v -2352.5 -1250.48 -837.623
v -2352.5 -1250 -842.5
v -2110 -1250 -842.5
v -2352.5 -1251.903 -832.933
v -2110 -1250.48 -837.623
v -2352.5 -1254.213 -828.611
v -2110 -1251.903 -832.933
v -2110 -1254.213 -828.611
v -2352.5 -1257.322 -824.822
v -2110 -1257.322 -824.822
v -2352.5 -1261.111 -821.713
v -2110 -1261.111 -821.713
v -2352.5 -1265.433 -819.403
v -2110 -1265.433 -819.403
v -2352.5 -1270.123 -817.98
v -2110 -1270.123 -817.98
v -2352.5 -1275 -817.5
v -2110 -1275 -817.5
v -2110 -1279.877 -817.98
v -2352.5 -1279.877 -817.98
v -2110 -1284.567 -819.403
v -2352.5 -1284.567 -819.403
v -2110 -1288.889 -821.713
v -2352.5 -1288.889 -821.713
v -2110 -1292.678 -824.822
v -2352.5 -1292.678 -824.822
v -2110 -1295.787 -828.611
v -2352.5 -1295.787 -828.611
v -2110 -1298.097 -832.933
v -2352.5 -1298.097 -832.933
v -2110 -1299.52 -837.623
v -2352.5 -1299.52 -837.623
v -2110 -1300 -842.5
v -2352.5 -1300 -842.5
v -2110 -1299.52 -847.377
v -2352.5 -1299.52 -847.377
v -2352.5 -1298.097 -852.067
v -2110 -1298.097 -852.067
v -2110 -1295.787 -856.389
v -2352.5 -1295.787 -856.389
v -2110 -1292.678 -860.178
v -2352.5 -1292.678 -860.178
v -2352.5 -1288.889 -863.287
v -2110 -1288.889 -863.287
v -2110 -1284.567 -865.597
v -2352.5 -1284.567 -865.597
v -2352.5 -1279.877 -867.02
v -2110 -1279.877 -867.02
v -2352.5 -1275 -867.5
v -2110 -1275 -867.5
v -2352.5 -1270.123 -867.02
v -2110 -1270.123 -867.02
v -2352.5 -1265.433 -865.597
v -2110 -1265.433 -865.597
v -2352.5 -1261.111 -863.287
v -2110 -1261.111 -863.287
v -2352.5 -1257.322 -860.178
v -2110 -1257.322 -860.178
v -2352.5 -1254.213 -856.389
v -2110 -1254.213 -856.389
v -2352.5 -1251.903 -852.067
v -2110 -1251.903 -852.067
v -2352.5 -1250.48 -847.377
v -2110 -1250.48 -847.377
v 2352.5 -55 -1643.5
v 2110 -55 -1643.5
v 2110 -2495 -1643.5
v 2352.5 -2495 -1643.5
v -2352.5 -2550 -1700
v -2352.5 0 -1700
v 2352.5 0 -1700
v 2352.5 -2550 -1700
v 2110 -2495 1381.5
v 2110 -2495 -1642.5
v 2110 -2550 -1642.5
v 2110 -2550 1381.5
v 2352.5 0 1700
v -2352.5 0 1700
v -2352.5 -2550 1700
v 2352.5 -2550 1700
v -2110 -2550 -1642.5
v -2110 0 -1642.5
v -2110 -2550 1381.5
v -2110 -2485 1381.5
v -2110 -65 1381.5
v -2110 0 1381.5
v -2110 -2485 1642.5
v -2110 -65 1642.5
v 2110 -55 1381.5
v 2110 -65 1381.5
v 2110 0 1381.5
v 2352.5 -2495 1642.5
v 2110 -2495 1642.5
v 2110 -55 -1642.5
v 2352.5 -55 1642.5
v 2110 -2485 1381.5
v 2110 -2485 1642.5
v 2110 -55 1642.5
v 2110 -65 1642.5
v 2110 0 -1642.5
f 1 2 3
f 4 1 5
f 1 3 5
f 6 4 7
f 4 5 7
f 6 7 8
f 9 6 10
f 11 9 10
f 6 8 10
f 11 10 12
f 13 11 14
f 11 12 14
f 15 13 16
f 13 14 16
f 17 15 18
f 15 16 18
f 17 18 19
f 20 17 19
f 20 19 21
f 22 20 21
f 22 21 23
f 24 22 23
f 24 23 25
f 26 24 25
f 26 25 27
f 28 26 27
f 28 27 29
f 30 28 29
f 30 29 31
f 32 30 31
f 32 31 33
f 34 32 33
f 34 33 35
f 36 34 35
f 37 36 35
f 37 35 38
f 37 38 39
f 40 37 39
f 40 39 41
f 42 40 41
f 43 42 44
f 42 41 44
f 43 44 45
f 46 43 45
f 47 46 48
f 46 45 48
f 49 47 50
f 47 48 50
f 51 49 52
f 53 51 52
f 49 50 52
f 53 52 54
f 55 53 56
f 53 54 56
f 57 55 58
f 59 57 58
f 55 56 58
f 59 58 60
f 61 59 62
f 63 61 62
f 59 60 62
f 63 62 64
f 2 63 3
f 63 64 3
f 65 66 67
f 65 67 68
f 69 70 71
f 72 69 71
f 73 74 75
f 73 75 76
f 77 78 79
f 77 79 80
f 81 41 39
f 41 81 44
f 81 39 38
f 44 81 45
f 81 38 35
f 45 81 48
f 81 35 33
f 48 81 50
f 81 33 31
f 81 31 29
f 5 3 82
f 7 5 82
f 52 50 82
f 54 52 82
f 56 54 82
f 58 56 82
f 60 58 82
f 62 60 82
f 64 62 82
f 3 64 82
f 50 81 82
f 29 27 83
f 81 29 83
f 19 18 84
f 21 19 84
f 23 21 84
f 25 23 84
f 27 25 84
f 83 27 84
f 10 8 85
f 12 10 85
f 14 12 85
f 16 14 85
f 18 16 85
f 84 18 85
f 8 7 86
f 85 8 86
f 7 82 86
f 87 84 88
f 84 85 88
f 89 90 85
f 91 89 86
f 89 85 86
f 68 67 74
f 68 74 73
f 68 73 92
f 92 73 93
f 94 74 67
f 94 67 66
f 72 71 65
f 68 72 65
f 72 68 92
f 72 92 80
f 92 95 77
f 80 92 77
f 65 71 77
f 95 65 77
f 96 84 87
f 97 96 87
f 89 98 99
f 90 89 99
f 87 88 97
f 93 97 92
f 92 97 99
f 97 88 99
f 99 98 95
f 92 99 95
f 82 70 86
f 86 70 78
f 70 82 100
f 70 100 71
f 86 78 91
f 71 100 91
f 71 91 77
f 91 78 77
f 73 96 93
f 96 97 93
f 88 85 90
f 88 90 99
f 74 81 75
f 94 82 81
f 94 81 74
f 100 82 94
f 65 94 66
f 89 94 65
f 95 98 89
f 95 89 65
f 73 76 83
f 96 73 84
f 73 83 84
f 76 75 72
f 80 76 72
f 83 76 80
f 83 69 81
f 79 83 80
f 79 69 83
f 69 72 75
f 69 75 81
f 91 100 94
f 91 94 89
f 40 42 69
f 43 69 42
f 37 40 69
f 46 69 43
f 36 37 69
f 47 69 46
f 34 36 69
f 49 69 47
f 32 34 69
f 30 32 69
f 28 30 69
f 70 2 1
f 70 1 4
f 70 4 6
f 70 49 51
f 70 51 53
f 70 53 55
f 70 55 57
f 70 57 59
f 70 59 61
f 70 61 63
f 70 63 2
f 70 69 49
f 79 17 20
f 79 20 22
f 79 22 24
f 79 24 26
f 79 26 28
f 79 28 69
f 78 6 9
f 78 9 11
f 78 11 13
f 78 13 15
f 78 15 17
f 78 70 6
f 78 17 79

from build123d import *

# Parameters (mm, degrees)
F0_W      = 4705
F0_H      = 3400
F0_W_2    = 4220
F0_H_2    = 3285
F1_DEPTH  = 2550
F2_W      = 65
F2_H      = 261
F3_DEPTH  = 4220
F4_W      = 2440
F4_H      = 3285
F5_DEPTH  = 242.5
F6_R      = 25
F7_DEPTH  = 242.501
F9_W      = 242.5
F9_H      = 2440
F10_DEPTH = 1


with BuildPart() as f1:
    # F0 (on Front) → F1 (new body)
    with BuildSketch(Plane.XZ):
        Rectangle(F0_W, F0_H)
        Rectangle(F0_W_2, F0_H_2, mode=Mode.SUBTRACT)
    extrude(amount=F1_DEPTH)

    # F2 (on face) → F3 (join, through all)
    with BuildSketch(Plane.YZ.offset(-2110)):
        with Locations((-2517.5, 1512)):
            Rectangle(F2_W, F2_H)
        with Locations((-32.5, 1512)):
            Rectangle(F2_W, F2_H)
    extrude(amount=F3_DEPTH)

    # F4 (on face) → F5 (cut, through all)
    with BuildSketch(Plane(origin=(2110, 0, 0), x_dir=(0, -1, 0), z_dir=(-1, 0, 0))):
        with Locations((1275, 0)):
            Rectangle(F4_W, F4_H)
    extrude(amount=-F5_DEPTH, mode=Mode.SUBTRACT)

    # F6 (on face) → F7 (cut, through all)
    with BuildSketch(Plane.YZ.offset(-2110)):
        with Locations((-1275, -842.5)):
            Circle(F6_R)
    extrude(amount=-F7_DEPTH, mode=Mode.SUBTRACT)

    # F9 (on face) → F10 (cut)
    with BuildSketch(Plane.XY.offset(-1642.5)):
        with Locations((2231.25, -1275)):
            Rectangle(F9_W, F9_H)
    extrude(amount=-F10_DEPTH, mode=Mode.SUBTRACT)


solid = f1.part
